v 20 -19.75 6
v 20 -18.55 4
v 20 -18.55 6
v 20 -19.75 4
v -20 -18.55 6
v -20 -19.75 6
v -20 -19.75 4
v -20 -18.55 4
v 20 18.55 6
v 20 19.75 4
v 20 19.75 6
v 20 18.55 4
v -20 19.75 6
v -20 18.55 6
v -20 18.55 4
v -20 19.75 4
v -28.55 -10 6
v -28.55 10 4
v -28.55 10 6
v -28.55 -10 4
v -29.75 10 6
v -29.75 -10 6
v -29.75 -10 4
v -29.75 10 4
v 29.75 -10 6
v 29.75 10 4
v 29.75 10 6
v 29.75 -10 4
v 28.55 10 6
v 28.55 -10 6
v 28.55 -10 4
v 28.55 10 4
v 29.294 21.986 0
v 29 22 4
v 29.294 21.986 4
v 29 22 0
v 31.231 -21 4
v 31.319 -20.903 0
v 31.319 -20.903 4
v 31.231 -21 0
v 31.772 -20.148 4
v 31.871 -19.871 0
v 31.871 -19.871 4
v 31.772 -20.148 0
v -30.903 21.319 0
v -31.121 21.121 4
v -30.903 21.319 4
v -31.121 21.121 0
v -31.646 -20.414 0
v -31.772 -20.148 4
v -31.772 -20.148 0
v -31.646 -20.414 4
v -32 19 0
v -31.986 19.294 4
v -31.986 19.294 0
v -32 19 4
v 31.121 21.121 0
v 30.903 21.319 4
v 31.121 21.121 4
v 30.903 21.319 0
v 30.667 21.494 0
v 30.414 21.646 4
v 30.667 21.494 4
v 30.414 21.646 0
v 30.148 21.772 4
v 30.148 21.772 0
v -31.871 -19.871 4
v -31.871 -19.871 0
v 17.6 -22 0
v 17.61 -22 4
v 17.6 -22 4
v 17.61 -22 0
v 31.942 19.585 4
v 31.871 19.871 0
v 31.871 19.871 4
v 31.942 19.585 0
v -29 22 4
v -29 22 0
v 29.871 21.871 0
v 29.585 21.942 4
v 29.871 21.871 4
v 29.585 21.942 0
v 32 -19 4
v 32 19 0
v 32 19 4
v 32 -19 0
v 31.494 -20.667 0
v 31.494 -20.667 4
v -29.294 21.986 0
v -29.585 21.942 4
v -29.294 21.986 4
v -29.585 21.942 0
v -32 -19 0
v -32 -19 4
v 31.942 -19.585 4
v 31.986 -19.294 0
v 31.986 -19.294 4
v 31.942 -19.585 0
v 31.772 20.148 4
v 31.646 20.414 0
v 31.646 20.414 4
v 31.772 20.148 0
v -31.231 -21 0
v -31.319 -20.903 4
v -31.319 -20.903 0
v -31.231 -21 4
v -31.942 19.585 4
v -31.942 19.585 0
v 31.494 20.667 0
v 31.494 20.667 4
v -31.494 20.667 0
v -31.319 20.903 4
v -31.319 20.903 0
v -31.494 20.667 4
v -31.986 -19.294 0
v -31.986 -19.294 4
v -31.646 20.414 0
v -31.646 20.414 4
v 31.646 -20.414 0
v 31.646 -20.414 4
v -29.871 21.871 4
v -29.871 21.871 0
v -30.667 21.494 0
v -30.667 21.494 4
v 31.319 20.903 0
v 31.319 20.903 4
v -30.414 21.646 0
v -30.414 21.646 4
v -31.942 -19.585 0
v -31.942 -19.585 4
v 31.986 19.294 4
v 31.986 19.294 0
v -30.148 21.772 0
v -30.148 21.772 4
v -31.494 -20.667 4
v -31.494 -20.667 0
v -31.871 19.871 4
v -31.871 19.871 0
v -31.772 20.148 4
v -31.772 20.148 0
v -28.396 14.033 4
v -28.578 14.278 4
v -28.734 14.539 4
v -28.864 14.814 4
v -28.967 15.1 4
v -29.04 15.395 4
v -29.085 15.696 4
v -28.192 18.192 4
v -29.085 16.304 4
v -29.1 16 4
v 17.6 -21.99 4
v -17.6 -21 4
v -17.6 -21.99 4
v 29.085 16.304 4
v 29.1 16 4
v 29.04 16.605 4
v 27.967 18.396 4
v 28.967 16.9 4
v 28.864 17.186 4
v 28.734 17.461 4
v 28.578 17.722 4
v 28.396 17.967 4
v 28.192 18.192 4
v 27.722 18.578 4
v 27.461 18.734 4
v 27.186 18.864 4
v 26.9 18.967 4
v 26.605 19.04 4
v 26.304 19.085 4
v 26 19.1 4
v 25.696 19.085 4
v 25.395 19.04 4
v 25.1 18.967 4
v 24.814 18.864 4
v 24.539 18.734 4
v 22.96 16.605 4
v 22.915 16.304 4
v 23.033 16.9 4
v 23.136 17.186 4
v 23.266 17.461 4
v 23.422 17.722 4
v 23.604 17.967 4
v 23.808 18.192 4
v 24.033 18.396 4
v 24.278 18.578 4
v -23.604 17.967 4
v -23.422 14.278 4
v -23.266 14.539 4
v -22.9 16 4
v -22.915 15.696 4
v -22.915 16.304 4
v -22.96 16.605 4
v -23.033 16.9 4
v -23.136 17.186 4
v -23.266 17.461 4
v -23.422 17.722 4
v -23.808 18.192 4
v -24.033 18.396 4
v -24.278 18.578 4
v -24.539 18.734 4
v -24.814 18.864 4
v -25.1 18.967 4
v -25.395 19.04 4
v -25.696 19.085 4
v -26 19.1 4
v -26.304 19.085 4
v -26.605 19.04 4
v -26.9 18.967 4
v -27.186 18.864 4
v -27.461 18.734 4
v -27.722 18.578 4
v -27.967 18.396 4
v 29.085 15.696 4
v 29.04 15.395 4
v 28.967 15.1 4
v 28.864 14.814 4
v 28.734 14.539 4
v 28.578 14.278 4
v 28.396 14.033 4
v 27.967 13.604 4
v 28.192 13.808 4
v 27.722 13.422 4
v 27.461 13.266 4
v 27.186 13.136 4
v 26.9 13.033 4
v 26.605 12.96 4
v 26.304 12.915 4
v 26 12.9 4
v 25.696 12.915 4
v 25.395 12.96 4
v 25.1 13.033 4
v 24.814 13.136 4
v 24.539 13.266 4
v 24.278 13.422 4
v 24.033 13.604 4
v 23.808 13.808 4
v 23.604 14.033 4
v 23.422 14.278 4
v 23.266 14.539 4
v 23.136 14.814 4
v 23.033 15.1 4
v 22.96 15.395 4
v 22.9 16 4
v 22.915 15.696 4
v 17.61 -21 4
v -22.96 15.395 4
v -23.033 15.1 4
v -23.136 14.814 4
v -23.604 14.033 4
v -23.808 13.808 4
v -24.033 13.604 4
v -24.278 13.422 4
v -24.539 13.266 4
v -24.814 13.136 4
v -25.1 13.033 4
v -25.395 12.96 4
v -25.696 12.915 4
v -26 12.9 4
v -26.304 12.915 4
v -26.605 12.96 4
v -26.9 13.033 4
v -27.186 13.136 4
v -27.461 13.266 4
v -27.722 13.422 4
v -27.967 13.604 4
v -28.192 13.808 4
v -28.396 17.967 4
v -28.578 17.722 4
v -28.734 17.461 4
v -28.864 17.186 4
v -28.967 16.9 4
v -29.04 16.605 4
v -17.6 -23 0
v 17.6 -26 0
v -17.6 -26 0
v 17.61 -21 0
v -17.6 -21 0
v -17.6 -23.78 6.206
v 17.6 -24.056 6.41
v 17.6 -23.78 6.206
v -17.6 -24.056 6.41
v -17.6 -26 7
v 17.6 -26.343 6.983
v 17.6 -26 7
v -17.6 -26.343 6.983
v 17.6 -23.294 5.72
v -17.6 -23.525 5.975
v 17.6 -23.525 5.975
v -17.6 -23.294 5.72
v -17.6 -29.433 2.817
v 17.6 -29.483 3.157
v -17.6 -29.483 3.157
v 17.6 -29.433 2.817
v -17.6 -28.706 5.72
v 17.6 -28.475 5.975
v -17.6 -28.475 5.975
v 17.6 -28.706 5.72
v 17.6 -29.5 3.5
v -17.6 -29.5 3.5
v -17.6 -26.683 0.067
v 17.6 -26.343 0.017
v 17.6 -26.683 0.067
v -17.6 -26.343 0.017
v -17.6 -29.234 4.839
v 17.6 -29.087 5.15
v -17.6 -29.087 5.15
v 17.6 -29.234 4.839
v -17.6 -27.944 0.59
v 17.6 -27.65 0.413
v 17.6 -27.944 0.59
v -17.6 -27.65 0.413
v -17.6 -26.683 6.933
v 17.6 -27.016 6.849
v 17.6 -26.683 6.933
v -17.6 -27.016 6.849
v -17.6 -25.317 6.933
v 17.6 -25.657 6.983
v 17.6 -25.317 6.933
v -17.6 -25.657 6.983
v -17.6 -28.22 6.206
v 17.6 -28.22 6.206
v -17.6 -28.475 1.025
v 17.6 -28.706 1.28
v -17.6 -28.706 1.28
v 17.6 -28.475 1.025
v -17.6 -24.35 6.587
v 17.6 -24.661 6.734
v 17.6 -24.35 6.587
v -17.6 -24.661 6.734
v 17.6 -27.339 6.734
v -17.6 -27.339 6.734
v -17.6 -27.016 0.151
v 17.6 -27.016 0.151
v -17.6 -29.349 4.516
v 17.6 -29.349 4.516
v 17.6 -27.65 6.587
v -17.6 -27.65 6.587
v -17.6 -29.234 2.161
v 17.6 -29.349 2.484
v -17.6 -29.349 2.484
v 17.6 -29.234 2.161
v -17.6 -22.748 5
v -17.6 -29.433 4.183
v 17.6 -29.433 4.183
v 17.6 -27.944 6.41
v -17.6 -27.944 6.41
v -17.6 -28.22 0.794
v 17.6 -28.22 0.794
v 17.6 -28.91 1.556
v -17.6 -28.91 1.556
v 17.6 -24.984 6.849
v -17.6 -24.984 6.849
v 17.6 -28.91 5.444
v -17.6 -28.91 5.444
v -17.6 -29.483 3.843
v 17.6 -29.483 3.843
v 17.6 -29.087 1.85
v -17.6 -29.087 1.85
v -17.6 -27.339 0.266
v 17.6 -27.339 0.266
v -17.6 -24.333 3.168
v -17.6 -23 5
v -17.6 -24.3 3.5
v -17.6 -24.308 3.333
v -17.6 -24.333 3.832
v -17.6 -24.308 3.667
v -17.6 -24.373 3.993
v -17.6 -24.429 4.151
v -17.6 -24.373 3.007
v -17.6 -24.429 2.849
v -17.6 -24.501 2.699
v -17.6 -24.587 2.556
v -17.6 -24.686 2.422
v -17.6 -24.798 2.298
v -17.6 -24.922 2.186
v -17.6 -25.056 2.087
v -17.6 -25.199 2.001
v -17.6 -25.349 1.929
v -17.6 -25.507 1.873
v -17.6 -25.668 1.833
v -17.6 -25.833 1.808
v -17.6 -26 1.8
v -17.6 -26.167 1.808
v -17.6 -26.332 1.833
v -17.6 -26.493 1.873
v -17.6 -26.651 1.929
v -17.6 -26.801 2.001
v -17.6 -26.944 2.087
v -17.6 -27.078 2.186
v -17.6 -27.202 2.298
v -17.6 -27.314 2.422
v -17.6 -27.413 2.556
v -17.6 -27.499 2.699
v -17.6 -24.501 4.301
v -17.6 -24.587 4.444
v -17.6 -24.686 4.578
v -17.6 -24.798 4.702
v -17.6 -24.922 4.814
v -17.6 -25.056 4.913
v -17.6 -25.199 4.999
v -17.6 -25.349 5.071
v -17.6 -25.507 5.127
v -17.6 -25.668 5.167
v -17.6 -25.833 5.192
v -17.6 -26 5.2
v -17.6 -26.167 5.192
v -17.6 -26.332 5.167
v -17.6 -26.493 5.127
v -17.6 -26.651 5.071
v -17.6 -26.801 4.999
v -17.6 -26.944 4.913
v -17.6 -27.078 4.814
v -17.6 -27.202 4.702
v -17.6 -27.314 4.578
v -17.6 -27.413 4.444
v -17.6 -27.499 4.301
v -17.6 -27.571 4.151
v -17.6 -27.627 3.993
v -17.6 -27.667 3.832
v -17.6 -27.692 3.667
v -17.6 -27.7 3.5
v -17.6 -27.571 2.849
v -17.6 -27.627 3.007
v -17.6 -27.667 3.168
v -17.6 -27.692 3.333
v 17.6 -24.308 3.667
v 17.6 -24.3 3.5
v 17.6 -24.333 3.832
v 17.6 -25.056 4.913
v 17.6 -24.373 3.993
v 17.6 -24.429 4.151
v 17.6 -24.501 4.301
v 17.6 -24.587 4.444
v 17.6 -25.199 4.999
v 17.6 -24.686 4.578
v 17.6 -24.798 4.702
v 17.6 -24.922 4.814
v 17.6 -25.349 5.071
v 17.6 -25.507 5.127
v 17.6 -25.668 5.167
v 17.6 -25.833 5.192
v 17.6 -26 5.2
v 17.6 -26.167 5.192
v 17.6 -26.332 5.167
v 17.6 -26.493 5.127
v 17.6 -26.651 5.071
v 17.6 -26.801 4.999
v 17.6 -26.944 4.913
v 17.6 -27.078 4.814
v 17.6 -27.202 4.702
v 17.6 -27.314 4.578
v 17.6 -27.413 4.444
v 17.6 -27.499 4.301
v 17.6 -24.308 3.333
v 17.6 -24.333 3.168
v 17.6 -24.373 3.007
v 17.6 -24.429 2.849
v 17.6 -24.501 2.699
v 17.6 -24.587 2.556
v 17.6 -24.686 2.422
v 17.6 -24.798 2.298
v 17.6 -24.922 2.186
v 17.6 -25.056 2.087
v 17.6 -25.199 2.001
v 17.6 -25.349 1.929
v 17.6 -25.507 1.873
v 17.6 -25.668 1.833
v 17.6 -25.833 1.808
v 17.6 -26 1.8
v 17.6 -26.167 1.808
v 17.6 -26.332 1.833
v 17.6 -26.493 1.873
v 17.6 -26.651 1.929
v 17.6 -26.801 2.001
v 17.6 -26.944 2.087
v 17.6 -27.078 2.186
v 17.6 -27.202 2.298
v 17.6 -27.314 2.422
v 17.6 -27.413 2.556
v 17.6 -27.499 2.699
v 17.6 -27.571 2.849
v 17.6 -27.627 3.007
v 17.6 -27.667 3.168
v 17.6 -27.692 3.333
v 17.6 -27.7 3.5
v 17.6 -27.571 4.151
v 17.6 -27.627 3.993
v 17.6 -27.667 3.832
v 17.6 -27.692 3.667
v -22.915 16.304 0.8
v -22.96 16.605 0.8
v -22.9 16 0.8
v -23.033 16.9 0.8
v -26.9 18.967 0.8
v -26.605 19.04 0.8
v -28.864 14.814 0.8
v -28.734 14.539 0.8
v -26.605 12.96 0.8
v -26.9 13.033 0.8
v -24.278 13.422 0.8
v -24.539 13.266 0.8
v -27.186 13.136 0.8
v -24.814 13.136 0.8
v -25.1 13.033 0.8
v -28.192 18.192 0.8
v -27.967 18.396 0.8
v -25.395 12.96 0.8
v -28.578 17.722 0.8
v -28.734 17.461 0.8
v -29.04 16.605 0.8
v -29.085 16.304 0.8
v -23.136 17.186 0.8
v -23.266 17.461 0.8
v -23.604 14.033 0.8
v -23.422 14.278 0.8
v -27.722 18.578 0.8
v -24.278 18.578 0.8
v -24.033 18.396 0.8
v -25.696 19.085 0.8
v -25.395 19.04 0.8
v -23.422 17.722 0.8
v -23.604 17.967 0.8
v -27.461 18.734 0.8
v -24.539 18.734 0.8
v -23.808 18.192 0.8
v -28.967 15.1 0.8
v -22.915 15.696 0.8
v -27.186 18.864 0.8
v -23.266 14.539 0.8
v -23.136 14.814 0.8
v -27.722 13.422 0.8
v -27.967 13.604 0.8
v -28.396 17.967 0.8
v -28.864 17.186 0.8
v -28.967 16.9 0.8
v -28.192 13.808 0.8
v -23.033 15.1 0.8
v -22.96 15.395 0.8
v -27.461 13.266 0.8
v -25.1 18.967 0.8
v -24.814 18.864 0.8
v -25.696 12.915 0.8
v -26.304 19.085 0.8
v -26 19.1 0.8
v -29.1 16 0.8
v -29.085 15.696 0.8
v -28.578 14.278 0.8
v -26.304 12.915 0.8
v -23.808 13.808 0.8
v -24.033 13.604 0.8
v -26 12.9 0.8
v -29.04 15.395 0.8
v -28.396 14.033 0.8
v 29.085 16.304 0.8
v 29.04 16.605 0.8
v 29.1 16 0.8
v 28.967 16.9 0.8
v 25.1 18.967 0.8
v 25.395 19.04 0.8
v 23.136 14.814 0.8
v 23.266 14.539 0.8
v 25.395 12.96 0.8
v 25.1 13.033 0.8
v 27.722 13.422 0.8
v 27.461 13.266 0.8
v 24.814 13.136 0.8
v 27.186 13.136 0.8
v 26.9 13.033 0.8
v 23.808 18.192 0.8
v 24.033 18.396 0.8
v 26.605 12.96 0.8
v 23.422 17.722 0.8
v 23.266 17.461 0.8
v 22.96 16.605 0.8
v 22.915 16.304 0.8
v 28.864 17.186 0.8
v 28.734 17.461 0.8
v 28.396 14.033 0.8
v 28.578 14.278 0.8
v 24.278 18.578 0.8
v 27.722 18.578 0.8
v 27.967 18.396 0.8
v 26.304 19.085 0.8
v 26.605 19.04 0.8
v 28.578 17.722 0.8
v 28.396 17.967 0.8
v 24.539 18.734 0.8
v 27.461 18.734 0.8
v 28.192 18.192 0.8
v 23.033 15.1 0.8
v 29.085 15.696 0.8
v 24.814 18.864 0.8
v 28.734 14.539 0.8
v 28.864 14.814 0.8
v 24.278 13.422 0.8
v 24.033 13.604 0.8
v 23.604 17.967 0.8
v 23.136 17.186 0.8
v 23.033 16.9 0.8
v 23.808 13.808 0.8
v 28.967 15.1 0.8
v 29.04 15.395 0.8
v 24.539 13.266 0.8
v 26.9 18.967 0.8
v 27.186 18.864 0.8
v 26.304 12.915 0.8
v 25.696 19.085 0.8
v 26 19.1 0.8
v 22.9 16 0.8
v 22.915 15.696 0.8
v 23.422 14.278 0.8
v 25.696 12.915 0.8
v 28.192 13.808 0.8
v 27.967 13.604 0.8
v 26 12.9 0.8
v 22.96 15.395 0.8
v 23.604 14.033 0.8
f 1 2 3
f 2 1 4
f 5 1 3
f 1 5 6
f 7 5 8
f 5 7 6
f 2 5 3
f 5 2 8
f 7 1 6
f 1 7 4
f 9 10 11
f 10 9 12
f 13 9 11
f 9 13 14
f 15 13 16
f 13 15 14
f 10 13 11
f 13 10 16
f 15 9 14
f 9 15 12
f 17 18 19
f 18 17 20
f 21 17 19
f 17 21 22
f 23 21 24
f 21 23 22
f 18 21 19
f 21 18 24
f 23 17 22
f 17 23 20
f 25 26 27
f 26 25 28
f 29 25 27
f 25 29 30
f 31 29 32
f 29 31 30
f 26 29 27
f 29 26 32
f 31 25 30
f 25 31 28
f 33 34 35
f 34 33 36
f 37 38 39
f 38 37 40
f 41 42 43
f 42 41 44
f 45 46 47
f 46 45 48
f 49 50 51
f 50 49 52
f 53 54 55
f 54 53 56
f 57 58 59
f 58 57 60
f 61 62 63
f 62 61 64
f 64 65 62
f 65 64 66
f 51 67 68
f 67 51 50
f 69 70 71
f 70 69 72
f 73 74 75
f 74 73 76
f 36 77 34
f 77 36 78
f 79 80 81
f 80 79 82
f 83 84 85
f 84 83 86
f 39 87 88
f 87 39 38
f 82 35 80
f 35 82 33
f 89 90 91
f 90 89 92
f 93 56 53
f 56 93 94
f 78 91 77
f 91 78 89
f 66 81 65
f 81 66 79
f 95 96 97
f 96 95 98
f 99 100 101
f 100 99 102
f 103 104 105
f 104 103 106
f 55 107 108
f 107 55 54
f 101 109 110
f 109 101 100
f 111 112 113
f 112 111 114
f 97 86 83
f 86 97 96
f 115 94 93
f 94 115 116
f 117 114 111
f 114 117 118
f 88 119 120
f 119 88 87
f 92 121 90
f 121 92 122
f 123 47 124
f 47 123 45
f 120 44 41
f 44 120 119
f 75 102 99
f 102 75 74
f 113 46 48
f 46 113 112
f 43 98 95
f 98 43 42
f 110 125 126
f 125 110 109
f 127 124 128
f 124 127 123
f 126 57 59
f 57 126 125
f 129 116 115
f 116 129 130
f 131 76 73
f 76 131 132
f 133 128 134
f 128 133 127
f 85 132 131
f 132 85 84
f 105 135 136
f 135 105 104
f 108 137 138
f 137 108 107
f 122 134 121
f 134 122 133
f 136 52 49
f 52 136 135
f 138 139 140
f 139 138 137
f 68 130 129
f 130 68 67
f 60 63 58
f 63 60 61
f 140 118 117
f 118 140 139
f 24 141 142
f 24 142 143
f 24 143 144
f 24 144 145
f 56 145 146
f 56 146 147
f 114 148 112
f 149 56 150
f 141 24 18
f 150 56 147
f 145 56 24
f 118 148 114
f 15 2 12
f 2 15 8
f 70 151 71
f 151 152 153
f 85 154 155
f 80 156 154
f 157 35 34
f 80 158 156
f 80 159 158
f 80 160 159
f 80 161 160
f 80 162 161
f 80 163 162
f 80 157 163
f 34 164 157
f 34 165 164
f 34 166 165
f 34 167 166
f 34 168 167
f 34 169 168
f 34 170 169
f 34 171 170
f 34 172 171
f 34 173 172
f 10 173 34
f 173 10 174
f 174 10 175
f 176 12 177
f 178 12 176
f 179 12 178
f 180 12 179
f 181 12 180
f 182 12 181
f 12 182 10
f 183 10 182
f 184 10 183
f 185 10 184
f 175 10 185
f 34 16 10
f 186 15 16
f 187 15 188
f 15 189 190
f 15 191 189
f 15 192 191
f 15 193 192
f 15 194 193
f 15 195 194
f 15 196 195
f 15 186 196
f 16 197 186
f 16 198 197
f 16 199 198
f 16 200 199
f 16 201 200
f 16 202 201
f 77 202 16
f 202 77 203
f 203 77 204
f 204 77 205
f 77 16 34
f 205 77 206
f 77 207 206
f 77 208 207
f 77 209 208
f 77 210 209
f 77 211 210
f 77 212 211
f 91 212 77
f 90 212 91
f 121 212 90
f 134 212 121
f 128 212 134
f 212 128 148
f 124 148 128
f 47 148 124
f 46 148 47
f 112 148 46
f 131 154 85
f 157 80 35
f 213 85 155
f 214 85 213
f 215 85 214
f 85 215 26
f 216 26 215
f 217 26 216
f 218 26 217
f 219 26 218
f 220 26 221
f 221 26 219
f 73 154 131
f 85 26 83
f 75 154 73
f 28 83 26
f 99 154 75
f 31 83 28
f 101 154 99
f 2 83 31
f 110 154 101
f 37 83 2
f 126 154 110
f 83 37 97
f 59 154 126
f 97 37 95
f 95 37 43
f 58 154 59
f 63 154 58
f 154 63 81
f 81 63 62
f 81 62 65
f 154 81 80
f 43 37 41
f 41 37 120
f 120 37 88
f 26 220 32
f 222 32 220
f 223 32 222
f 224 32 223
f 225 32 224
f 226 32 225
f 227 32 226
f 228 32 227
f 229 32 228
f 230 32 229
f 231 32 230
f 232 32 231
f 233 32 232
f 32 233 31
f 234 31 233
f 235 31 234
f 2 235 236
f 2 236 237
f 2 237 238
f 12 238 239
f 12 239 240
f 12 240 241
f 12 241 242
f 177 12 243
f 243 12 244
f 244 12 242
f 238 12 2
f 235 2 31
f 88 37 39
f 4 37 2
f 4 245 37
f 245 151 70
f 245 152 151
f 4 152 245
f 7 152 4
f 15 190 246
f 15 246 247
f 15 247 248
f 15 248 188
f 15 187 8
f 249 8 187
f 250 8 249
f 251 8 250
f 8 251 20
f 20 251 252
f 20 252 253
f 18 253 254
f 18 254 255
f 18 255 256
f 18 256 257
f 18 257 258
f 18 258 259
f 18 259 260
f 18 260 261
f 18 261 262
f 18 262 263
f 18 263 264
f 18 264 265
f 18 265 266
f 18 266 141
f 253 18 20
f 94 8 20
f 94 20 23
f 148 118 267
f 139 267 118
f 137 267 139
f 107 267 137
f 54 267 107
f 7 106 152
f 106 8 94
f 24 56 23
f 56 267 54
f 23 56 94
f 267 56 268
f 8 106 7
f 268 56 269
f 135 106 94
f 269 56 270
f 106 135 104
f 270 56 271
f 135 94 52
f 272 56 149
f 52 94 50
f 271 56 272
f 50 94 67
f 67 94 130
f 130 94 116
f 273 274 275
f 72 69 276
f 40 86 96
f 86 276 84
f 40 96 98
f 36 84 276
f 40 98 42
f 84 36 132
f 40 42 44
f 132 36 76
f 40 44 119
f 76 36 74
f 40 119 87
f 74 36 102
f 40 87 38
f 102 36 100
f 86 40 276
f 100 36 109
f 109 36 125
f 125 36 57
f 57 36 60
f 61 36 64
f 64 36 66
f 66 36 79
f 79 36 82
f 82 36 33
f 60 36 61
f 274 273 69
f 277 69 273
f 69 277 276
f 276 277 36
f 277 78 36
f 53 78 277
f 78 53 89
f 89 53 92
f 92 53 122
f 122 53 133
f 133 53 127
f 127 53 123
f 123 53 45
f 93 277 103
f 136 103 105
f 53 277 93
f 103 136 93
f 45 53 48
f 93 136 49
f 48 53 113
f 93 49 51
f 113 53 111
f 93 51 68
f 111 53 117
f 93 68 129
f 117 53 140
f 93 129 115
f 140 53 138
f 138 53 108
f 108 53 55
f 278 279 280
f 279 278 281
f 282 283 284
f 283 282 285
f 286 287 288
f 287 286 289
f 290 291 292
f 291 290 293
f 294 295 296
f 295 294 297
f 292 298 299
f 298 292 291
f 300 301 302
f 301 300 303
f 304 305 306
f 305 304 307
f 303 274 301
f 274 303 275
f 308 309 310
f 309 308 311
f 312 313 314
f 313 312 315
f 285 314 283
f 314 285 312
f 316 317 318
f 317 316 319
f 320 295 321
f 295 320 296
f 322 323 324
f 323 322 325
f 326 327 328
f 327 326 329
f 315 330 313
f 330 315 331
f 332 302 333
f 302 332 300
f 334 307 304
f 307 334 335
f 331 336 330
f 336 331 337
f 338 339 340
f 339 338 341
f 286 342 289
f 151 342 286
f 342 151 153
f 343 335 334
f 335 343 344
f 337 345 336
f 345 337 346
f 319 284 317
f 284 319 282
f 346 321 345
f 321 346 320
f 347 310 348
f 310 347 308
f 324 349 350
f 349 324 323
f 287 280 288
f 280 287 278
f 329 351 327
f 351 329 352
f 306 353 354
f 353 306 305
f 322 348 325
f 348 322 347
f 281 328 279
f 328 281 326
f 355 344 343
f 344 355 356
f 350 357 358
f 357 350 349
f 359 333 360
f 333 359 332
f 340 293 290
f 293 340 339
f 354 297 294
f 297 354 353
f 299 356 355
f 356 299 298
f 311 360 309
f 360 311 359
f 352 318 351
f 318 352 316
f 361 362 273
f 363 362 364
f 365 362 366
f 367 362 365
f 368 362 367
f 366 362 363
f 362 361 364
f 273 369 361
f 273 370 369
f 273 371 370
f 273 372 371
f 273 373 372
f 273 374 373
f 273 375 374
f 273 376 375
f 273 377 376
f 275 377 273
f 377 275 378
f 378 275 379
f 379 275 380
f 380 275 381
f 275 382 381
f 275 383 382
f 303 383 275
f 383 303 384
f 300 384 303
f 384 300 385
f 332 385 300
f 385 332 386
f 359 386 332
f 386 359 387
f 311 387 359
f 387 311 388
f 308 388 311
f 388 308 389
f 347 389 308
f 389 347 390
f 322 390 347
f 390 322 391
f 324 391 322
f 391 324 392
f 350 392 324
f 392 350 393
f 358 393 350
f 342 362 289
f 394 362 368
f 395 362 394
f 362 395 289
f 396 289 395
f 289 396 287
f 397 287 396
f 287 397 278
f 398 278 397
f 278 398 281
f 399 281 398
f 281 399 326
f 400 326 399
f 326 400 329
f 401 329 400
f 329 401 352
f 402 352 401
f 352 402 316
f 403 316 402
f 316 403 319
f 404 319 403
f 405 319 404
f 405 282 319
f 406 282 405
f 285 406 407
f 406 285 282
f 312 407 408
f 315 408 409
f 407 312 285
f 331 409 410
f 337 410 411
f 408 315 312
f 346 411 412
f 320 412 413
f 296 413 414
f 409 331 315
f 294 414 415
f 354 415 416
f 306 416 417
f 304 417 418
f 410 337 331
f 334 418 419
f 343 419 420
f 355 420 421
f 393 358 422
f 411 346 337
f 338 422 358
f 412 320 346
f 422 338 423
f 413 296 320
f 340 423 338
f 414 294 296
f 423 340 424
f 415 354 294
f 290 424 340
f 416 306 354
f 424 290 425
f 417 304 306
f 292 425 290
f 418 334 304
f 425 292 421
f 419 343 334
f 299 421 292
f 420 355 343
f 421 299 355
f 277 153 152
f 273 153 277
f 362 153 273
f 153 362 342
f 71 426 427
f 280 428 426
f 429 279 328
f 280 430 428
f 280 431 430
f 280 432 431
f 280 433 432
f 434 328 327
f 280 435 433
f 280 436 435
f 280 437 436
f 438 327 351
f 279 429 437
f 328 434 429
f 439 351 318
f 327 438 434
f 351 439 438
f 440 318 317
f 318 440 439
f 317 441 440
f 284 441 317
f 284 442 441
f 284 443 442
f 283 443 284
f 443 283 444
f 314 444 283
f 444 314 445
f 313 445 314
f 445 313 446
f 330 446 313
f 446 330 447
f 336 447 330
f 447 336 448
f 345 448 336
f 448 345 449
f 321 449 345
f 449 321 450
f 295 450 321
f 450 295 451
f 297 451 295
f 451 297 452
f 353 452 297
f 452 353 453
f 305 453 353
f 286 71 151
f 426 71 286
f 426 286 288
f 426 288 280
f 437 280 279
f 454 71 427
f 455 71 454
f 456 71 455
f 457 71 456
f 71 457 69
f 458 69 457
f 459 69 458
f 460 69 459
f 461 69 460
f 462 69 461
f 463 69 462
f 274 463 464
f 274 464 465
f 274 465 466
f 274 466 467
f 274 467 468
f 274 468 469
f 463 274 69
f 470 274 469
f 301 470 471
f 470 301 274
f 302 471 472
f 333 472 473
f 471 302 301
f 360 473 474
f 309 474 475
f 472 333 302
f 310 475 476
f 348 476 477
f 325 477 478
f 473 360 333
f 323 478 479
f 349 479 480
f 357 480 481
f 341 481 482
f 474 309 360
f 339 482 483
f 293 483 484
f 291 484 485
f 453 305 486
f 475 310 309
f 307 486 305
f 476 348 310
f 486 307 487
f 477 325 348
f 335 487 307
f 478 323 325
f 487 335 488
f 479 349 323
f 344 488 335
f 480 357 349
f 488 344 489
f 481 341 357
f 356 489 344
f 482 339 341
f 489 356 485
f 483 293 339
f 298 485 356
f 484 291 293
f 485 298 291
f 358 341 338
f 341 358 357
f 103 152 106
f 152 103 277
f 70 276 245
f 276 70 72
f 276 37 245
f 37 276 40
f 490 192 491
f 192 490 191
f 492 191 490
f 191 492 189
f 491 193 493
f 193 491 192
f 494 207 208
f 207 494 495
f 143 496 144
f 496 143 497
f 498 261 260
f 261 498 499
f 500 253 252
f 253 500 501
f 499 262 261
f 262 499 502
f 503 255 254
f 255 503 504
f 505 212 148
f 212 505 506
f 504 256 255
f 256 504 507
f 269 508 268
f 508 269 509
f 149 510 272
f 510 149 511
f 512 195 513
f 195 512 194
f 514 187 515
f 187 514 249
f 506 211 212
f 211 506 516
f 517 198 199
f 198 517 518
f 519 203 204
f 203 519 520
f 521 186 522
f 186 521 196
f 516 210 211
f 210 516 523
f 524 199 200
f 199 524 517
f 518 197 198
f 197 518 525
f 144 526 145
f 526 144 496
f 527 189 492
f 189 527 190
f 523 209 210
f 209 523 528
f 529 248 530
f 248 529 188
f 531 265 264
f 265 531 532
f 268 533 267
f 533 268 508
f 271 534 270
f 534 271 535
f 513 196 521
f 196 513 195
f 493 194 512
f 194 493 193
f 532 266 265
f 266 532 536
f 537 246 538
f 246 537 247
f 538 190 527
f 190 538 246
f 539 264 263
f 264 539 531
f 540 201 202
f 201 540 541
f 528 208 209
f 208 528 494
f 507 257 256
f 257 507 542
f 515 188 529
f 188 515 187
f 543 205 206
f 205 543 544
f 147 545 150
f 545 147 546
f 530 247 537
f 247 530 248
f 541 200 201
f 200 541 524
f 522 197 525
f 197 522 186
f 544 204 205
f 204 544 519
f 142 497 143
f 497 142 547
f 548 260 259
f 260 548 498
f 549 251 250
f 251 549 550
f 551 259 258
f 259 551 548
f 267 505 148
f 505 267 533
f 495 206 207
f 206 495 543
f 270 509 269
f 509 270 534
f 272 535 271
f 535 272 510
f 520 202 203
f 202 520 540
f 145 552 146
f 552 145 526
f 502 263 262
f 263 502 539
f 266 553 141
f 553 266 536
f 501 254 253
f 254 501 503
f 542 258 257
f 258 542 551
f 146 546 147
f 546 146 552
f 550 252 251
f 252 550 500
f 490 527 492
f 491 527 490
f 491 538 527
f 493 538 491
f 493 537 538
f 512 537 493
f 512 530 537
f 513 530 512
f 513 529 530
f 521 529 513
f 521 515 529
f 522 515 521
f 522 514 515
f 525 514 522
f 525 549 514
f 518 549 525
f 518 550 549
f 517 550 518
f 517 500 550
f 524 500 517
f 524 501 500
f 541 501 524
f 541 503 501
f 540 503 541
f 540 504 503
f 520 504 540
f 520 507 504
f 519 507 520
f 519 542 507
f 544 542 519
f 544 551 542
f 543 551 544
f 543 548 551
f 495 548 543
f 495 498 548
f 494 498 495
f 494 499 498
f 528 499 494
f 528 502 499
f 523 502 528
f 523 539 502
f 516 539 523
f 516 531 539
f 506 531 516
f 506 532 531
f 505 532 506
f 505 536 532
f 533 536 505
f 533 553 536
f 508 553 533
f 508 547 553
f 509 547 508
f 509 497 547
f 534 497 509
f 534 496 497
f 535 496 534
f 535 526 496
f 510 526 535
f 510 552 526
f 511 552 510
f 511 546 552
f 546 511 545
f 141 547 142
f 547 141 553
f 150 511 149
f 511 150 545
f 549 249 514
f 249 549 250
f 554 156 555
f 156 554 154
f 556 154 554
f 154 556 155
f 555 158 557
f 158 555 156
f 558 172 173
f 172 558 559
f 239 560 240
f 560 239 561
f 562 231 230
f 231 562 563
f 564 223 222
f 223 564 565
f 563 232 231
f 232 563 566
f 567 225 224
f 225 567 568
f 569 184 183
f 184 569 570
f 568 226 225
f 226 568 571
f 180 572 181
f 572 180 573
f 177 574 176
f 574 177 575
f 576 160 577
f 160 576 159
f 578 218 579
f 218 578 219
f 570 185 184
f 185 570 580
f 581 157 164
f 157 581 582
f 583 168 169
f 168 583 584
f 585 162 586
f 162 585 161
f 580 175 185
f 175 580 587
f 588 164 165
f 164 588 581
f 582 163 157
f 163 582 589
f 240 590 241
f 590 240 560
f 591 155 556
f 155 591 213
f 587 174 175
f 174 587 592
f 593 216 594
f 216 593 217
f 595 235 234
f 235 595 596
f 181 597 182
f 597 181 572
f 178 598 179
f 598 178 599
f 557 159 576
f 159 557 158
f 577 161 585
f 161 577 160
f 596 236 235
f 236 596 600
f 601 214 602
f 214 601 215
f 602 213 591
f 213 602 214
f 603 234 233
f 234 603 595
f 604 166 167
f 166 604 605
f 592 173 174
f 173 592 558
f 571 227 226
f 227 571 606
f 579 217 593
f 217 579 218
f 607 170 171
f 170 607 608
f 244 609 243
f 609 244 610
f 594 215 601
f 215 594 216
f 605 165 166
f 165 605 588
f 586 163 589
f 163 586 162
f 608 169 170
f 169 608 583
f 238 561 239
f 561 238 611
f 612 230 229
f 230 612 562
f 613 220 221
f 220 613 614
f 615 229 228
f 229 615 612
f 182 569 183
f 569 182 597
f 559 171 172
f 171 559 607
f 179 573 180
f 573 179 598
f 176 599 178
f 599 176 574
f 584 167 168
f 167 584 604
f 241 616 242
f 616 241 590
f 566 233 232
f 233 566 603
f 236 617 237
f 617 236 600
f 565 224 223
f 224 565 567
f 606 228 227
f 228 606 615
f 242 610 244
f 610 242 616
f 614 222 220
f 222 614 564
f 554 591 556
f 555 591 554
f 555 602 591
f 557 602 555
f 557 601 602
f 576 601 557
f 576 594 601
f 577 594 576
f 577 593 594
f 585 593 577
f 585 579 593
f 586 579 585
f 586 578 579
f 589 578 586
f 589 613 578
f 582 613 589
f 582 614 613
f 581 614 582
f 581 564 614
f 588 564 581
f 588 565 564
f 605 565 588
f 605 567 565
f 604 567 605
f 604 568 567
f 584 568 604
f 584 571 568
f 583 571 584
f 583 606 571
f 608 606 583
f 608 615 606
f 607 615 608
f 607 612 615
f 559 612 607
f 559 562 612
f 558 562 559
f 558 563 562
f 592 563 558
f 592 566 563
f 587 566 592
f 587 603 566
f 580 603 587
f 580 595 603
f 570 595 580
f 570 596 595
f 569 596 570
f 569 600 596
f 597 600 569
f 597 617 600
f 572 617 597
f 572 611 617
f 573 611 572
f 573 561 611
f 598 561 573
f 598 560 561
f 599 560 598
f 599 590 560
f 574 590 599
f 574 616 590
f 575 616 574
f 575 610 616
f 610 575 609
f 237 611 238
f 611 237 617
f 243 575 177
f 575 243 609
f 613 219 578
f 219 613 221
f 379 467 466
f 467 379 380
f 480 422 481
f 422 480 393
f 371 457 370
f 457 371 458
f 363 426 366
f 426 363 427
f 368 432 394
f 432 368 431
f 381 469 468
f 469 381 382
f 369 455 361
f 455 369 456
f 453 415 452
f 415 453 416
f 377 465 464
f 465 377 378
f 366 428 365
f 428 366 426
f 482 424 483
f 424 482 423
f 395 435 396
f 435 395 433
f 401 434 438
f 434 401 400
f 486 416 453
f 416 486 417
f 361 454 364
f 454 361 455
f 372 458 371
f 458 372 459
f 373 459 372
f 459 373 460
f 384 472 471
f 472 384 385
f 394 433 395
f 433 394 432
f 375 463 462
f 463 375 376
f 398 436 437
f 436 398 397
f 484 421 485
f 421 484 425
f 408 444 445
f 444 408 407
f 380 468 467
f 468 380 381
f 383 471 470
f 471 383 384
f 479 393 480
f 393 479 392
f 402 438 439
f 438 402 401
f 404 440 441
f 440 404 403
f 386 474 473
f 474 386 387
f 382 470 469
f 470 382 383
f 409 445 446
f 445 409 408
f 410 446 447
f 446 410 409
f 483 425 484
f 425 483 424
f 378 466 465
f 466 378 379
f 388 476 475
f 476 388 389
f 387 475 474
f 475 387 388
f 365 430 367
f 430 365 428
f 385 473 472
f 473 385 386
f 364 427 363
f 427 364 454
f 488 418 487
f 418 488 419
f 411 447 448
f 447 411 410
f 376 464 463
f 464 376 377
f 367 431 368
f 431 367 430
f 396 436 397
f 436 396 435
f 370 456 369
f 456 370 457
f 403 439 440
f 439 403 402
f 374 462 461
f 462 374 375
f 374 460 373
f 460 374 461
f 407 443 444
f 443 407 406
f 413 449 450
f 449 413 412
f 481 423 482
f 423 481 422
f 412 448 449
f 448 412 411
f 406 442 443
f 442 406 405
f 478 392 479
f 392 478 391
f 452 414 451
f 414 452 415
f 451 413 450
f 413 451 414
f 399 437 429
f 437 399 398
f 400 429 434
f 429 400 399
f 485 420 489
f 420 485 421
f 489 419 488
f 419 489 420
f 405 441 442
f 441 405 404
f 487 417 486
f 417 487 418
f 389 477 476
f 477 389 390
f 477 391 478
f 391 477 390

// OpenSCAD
// Hinged lid, printed top-face down. Centre hinge knuckle, 2 magnet pockets, locating lip.
/* [Size] */
length = 64; // [40:1:150]
width = 44;  // [30:1:120]
thickness = 4; // [3:0.2:6]
wall = 2;
/* [Hardware] */
magnet_d = 6.2;
magnet_depth = 3.2;
pin_clearance = 3.4; // free-turning on the 3 mm pin
/* [Hinge] */
knuckle_r = 3.5;
knuckle_half = 17.6; // knuckle spans -17.6..17.6 (0.4 mm gap to the base knuckles)
/* [Hidden] */
$fn = $preview ? 32 : 64;
r = 3;
boss_inset = 6;
gap = 0.25;
hinge_off = 4;       // hinge axis distance behind the lid's back edge
module rbox(l, w, h, r) hull() for (x = [-l/2 + r, l/2 - r], y = [-w/2 + r, w/2 - r]) translate([x, y, 0]) cylinder(r = r, h = h);
// Print coordinates: top face on z = 0, the hinge edge is -Y.
module lid() {
  difference() {
    union() {
      rbox(length, width, thickness, r);
      il = length - 2*wall - 2*gap; iw = width - 2*wall - 2*gap;
      for (y = [-1, 1]) translate([-20, y > 0 ? iw/2 - 1.2 : -iw/2, thickness - 0.01]) cube([40, 1.2, 2.01]);
      for (x = [-1, 1]) translate([x > 0 ? il/2 - 1.2 : -il/2, -10, thickness - 0.01]) cube([1.2, 20, 2.01]);
      hull() {
        translate([-knuckle_half, -width/2 - hinge_off, knuckle_r]) rotate([0, 90, 0]) cylinder(r = knuckle_r, h = 2 * knuckle_half);
        translate([-knuckle_half, -width/2 + 0.01 - 1, 0]) cube([2 * knuckle_half, 1, thickness]);
      }
    }
    translate([-knuckle_half - 1, -width/2 - hinge_off, knuckle_r]) rotate([0, 90, 0]) cylinder(d = pin_clearance, h = 2 * knuckle_half + 2);
    // relief so the lid's corners clear the base knuckles while it swings
    for (x = [-1, 1]) translate([x > 0 ? knuckle_half + 0.01 : -length/2 - 1, -width/2 - 1, -1]) cube([length/2 - knuckle_half + 1, 2, thickness + 2]);
    for (x = [-1, 1])
      translate([x * (length/2 - boss_inset), width/2 - boss_inset, thickness - magnet_depth]) cylinder(d = magnet_d, h = magnet_depth + 1);
  }
}
lid();
